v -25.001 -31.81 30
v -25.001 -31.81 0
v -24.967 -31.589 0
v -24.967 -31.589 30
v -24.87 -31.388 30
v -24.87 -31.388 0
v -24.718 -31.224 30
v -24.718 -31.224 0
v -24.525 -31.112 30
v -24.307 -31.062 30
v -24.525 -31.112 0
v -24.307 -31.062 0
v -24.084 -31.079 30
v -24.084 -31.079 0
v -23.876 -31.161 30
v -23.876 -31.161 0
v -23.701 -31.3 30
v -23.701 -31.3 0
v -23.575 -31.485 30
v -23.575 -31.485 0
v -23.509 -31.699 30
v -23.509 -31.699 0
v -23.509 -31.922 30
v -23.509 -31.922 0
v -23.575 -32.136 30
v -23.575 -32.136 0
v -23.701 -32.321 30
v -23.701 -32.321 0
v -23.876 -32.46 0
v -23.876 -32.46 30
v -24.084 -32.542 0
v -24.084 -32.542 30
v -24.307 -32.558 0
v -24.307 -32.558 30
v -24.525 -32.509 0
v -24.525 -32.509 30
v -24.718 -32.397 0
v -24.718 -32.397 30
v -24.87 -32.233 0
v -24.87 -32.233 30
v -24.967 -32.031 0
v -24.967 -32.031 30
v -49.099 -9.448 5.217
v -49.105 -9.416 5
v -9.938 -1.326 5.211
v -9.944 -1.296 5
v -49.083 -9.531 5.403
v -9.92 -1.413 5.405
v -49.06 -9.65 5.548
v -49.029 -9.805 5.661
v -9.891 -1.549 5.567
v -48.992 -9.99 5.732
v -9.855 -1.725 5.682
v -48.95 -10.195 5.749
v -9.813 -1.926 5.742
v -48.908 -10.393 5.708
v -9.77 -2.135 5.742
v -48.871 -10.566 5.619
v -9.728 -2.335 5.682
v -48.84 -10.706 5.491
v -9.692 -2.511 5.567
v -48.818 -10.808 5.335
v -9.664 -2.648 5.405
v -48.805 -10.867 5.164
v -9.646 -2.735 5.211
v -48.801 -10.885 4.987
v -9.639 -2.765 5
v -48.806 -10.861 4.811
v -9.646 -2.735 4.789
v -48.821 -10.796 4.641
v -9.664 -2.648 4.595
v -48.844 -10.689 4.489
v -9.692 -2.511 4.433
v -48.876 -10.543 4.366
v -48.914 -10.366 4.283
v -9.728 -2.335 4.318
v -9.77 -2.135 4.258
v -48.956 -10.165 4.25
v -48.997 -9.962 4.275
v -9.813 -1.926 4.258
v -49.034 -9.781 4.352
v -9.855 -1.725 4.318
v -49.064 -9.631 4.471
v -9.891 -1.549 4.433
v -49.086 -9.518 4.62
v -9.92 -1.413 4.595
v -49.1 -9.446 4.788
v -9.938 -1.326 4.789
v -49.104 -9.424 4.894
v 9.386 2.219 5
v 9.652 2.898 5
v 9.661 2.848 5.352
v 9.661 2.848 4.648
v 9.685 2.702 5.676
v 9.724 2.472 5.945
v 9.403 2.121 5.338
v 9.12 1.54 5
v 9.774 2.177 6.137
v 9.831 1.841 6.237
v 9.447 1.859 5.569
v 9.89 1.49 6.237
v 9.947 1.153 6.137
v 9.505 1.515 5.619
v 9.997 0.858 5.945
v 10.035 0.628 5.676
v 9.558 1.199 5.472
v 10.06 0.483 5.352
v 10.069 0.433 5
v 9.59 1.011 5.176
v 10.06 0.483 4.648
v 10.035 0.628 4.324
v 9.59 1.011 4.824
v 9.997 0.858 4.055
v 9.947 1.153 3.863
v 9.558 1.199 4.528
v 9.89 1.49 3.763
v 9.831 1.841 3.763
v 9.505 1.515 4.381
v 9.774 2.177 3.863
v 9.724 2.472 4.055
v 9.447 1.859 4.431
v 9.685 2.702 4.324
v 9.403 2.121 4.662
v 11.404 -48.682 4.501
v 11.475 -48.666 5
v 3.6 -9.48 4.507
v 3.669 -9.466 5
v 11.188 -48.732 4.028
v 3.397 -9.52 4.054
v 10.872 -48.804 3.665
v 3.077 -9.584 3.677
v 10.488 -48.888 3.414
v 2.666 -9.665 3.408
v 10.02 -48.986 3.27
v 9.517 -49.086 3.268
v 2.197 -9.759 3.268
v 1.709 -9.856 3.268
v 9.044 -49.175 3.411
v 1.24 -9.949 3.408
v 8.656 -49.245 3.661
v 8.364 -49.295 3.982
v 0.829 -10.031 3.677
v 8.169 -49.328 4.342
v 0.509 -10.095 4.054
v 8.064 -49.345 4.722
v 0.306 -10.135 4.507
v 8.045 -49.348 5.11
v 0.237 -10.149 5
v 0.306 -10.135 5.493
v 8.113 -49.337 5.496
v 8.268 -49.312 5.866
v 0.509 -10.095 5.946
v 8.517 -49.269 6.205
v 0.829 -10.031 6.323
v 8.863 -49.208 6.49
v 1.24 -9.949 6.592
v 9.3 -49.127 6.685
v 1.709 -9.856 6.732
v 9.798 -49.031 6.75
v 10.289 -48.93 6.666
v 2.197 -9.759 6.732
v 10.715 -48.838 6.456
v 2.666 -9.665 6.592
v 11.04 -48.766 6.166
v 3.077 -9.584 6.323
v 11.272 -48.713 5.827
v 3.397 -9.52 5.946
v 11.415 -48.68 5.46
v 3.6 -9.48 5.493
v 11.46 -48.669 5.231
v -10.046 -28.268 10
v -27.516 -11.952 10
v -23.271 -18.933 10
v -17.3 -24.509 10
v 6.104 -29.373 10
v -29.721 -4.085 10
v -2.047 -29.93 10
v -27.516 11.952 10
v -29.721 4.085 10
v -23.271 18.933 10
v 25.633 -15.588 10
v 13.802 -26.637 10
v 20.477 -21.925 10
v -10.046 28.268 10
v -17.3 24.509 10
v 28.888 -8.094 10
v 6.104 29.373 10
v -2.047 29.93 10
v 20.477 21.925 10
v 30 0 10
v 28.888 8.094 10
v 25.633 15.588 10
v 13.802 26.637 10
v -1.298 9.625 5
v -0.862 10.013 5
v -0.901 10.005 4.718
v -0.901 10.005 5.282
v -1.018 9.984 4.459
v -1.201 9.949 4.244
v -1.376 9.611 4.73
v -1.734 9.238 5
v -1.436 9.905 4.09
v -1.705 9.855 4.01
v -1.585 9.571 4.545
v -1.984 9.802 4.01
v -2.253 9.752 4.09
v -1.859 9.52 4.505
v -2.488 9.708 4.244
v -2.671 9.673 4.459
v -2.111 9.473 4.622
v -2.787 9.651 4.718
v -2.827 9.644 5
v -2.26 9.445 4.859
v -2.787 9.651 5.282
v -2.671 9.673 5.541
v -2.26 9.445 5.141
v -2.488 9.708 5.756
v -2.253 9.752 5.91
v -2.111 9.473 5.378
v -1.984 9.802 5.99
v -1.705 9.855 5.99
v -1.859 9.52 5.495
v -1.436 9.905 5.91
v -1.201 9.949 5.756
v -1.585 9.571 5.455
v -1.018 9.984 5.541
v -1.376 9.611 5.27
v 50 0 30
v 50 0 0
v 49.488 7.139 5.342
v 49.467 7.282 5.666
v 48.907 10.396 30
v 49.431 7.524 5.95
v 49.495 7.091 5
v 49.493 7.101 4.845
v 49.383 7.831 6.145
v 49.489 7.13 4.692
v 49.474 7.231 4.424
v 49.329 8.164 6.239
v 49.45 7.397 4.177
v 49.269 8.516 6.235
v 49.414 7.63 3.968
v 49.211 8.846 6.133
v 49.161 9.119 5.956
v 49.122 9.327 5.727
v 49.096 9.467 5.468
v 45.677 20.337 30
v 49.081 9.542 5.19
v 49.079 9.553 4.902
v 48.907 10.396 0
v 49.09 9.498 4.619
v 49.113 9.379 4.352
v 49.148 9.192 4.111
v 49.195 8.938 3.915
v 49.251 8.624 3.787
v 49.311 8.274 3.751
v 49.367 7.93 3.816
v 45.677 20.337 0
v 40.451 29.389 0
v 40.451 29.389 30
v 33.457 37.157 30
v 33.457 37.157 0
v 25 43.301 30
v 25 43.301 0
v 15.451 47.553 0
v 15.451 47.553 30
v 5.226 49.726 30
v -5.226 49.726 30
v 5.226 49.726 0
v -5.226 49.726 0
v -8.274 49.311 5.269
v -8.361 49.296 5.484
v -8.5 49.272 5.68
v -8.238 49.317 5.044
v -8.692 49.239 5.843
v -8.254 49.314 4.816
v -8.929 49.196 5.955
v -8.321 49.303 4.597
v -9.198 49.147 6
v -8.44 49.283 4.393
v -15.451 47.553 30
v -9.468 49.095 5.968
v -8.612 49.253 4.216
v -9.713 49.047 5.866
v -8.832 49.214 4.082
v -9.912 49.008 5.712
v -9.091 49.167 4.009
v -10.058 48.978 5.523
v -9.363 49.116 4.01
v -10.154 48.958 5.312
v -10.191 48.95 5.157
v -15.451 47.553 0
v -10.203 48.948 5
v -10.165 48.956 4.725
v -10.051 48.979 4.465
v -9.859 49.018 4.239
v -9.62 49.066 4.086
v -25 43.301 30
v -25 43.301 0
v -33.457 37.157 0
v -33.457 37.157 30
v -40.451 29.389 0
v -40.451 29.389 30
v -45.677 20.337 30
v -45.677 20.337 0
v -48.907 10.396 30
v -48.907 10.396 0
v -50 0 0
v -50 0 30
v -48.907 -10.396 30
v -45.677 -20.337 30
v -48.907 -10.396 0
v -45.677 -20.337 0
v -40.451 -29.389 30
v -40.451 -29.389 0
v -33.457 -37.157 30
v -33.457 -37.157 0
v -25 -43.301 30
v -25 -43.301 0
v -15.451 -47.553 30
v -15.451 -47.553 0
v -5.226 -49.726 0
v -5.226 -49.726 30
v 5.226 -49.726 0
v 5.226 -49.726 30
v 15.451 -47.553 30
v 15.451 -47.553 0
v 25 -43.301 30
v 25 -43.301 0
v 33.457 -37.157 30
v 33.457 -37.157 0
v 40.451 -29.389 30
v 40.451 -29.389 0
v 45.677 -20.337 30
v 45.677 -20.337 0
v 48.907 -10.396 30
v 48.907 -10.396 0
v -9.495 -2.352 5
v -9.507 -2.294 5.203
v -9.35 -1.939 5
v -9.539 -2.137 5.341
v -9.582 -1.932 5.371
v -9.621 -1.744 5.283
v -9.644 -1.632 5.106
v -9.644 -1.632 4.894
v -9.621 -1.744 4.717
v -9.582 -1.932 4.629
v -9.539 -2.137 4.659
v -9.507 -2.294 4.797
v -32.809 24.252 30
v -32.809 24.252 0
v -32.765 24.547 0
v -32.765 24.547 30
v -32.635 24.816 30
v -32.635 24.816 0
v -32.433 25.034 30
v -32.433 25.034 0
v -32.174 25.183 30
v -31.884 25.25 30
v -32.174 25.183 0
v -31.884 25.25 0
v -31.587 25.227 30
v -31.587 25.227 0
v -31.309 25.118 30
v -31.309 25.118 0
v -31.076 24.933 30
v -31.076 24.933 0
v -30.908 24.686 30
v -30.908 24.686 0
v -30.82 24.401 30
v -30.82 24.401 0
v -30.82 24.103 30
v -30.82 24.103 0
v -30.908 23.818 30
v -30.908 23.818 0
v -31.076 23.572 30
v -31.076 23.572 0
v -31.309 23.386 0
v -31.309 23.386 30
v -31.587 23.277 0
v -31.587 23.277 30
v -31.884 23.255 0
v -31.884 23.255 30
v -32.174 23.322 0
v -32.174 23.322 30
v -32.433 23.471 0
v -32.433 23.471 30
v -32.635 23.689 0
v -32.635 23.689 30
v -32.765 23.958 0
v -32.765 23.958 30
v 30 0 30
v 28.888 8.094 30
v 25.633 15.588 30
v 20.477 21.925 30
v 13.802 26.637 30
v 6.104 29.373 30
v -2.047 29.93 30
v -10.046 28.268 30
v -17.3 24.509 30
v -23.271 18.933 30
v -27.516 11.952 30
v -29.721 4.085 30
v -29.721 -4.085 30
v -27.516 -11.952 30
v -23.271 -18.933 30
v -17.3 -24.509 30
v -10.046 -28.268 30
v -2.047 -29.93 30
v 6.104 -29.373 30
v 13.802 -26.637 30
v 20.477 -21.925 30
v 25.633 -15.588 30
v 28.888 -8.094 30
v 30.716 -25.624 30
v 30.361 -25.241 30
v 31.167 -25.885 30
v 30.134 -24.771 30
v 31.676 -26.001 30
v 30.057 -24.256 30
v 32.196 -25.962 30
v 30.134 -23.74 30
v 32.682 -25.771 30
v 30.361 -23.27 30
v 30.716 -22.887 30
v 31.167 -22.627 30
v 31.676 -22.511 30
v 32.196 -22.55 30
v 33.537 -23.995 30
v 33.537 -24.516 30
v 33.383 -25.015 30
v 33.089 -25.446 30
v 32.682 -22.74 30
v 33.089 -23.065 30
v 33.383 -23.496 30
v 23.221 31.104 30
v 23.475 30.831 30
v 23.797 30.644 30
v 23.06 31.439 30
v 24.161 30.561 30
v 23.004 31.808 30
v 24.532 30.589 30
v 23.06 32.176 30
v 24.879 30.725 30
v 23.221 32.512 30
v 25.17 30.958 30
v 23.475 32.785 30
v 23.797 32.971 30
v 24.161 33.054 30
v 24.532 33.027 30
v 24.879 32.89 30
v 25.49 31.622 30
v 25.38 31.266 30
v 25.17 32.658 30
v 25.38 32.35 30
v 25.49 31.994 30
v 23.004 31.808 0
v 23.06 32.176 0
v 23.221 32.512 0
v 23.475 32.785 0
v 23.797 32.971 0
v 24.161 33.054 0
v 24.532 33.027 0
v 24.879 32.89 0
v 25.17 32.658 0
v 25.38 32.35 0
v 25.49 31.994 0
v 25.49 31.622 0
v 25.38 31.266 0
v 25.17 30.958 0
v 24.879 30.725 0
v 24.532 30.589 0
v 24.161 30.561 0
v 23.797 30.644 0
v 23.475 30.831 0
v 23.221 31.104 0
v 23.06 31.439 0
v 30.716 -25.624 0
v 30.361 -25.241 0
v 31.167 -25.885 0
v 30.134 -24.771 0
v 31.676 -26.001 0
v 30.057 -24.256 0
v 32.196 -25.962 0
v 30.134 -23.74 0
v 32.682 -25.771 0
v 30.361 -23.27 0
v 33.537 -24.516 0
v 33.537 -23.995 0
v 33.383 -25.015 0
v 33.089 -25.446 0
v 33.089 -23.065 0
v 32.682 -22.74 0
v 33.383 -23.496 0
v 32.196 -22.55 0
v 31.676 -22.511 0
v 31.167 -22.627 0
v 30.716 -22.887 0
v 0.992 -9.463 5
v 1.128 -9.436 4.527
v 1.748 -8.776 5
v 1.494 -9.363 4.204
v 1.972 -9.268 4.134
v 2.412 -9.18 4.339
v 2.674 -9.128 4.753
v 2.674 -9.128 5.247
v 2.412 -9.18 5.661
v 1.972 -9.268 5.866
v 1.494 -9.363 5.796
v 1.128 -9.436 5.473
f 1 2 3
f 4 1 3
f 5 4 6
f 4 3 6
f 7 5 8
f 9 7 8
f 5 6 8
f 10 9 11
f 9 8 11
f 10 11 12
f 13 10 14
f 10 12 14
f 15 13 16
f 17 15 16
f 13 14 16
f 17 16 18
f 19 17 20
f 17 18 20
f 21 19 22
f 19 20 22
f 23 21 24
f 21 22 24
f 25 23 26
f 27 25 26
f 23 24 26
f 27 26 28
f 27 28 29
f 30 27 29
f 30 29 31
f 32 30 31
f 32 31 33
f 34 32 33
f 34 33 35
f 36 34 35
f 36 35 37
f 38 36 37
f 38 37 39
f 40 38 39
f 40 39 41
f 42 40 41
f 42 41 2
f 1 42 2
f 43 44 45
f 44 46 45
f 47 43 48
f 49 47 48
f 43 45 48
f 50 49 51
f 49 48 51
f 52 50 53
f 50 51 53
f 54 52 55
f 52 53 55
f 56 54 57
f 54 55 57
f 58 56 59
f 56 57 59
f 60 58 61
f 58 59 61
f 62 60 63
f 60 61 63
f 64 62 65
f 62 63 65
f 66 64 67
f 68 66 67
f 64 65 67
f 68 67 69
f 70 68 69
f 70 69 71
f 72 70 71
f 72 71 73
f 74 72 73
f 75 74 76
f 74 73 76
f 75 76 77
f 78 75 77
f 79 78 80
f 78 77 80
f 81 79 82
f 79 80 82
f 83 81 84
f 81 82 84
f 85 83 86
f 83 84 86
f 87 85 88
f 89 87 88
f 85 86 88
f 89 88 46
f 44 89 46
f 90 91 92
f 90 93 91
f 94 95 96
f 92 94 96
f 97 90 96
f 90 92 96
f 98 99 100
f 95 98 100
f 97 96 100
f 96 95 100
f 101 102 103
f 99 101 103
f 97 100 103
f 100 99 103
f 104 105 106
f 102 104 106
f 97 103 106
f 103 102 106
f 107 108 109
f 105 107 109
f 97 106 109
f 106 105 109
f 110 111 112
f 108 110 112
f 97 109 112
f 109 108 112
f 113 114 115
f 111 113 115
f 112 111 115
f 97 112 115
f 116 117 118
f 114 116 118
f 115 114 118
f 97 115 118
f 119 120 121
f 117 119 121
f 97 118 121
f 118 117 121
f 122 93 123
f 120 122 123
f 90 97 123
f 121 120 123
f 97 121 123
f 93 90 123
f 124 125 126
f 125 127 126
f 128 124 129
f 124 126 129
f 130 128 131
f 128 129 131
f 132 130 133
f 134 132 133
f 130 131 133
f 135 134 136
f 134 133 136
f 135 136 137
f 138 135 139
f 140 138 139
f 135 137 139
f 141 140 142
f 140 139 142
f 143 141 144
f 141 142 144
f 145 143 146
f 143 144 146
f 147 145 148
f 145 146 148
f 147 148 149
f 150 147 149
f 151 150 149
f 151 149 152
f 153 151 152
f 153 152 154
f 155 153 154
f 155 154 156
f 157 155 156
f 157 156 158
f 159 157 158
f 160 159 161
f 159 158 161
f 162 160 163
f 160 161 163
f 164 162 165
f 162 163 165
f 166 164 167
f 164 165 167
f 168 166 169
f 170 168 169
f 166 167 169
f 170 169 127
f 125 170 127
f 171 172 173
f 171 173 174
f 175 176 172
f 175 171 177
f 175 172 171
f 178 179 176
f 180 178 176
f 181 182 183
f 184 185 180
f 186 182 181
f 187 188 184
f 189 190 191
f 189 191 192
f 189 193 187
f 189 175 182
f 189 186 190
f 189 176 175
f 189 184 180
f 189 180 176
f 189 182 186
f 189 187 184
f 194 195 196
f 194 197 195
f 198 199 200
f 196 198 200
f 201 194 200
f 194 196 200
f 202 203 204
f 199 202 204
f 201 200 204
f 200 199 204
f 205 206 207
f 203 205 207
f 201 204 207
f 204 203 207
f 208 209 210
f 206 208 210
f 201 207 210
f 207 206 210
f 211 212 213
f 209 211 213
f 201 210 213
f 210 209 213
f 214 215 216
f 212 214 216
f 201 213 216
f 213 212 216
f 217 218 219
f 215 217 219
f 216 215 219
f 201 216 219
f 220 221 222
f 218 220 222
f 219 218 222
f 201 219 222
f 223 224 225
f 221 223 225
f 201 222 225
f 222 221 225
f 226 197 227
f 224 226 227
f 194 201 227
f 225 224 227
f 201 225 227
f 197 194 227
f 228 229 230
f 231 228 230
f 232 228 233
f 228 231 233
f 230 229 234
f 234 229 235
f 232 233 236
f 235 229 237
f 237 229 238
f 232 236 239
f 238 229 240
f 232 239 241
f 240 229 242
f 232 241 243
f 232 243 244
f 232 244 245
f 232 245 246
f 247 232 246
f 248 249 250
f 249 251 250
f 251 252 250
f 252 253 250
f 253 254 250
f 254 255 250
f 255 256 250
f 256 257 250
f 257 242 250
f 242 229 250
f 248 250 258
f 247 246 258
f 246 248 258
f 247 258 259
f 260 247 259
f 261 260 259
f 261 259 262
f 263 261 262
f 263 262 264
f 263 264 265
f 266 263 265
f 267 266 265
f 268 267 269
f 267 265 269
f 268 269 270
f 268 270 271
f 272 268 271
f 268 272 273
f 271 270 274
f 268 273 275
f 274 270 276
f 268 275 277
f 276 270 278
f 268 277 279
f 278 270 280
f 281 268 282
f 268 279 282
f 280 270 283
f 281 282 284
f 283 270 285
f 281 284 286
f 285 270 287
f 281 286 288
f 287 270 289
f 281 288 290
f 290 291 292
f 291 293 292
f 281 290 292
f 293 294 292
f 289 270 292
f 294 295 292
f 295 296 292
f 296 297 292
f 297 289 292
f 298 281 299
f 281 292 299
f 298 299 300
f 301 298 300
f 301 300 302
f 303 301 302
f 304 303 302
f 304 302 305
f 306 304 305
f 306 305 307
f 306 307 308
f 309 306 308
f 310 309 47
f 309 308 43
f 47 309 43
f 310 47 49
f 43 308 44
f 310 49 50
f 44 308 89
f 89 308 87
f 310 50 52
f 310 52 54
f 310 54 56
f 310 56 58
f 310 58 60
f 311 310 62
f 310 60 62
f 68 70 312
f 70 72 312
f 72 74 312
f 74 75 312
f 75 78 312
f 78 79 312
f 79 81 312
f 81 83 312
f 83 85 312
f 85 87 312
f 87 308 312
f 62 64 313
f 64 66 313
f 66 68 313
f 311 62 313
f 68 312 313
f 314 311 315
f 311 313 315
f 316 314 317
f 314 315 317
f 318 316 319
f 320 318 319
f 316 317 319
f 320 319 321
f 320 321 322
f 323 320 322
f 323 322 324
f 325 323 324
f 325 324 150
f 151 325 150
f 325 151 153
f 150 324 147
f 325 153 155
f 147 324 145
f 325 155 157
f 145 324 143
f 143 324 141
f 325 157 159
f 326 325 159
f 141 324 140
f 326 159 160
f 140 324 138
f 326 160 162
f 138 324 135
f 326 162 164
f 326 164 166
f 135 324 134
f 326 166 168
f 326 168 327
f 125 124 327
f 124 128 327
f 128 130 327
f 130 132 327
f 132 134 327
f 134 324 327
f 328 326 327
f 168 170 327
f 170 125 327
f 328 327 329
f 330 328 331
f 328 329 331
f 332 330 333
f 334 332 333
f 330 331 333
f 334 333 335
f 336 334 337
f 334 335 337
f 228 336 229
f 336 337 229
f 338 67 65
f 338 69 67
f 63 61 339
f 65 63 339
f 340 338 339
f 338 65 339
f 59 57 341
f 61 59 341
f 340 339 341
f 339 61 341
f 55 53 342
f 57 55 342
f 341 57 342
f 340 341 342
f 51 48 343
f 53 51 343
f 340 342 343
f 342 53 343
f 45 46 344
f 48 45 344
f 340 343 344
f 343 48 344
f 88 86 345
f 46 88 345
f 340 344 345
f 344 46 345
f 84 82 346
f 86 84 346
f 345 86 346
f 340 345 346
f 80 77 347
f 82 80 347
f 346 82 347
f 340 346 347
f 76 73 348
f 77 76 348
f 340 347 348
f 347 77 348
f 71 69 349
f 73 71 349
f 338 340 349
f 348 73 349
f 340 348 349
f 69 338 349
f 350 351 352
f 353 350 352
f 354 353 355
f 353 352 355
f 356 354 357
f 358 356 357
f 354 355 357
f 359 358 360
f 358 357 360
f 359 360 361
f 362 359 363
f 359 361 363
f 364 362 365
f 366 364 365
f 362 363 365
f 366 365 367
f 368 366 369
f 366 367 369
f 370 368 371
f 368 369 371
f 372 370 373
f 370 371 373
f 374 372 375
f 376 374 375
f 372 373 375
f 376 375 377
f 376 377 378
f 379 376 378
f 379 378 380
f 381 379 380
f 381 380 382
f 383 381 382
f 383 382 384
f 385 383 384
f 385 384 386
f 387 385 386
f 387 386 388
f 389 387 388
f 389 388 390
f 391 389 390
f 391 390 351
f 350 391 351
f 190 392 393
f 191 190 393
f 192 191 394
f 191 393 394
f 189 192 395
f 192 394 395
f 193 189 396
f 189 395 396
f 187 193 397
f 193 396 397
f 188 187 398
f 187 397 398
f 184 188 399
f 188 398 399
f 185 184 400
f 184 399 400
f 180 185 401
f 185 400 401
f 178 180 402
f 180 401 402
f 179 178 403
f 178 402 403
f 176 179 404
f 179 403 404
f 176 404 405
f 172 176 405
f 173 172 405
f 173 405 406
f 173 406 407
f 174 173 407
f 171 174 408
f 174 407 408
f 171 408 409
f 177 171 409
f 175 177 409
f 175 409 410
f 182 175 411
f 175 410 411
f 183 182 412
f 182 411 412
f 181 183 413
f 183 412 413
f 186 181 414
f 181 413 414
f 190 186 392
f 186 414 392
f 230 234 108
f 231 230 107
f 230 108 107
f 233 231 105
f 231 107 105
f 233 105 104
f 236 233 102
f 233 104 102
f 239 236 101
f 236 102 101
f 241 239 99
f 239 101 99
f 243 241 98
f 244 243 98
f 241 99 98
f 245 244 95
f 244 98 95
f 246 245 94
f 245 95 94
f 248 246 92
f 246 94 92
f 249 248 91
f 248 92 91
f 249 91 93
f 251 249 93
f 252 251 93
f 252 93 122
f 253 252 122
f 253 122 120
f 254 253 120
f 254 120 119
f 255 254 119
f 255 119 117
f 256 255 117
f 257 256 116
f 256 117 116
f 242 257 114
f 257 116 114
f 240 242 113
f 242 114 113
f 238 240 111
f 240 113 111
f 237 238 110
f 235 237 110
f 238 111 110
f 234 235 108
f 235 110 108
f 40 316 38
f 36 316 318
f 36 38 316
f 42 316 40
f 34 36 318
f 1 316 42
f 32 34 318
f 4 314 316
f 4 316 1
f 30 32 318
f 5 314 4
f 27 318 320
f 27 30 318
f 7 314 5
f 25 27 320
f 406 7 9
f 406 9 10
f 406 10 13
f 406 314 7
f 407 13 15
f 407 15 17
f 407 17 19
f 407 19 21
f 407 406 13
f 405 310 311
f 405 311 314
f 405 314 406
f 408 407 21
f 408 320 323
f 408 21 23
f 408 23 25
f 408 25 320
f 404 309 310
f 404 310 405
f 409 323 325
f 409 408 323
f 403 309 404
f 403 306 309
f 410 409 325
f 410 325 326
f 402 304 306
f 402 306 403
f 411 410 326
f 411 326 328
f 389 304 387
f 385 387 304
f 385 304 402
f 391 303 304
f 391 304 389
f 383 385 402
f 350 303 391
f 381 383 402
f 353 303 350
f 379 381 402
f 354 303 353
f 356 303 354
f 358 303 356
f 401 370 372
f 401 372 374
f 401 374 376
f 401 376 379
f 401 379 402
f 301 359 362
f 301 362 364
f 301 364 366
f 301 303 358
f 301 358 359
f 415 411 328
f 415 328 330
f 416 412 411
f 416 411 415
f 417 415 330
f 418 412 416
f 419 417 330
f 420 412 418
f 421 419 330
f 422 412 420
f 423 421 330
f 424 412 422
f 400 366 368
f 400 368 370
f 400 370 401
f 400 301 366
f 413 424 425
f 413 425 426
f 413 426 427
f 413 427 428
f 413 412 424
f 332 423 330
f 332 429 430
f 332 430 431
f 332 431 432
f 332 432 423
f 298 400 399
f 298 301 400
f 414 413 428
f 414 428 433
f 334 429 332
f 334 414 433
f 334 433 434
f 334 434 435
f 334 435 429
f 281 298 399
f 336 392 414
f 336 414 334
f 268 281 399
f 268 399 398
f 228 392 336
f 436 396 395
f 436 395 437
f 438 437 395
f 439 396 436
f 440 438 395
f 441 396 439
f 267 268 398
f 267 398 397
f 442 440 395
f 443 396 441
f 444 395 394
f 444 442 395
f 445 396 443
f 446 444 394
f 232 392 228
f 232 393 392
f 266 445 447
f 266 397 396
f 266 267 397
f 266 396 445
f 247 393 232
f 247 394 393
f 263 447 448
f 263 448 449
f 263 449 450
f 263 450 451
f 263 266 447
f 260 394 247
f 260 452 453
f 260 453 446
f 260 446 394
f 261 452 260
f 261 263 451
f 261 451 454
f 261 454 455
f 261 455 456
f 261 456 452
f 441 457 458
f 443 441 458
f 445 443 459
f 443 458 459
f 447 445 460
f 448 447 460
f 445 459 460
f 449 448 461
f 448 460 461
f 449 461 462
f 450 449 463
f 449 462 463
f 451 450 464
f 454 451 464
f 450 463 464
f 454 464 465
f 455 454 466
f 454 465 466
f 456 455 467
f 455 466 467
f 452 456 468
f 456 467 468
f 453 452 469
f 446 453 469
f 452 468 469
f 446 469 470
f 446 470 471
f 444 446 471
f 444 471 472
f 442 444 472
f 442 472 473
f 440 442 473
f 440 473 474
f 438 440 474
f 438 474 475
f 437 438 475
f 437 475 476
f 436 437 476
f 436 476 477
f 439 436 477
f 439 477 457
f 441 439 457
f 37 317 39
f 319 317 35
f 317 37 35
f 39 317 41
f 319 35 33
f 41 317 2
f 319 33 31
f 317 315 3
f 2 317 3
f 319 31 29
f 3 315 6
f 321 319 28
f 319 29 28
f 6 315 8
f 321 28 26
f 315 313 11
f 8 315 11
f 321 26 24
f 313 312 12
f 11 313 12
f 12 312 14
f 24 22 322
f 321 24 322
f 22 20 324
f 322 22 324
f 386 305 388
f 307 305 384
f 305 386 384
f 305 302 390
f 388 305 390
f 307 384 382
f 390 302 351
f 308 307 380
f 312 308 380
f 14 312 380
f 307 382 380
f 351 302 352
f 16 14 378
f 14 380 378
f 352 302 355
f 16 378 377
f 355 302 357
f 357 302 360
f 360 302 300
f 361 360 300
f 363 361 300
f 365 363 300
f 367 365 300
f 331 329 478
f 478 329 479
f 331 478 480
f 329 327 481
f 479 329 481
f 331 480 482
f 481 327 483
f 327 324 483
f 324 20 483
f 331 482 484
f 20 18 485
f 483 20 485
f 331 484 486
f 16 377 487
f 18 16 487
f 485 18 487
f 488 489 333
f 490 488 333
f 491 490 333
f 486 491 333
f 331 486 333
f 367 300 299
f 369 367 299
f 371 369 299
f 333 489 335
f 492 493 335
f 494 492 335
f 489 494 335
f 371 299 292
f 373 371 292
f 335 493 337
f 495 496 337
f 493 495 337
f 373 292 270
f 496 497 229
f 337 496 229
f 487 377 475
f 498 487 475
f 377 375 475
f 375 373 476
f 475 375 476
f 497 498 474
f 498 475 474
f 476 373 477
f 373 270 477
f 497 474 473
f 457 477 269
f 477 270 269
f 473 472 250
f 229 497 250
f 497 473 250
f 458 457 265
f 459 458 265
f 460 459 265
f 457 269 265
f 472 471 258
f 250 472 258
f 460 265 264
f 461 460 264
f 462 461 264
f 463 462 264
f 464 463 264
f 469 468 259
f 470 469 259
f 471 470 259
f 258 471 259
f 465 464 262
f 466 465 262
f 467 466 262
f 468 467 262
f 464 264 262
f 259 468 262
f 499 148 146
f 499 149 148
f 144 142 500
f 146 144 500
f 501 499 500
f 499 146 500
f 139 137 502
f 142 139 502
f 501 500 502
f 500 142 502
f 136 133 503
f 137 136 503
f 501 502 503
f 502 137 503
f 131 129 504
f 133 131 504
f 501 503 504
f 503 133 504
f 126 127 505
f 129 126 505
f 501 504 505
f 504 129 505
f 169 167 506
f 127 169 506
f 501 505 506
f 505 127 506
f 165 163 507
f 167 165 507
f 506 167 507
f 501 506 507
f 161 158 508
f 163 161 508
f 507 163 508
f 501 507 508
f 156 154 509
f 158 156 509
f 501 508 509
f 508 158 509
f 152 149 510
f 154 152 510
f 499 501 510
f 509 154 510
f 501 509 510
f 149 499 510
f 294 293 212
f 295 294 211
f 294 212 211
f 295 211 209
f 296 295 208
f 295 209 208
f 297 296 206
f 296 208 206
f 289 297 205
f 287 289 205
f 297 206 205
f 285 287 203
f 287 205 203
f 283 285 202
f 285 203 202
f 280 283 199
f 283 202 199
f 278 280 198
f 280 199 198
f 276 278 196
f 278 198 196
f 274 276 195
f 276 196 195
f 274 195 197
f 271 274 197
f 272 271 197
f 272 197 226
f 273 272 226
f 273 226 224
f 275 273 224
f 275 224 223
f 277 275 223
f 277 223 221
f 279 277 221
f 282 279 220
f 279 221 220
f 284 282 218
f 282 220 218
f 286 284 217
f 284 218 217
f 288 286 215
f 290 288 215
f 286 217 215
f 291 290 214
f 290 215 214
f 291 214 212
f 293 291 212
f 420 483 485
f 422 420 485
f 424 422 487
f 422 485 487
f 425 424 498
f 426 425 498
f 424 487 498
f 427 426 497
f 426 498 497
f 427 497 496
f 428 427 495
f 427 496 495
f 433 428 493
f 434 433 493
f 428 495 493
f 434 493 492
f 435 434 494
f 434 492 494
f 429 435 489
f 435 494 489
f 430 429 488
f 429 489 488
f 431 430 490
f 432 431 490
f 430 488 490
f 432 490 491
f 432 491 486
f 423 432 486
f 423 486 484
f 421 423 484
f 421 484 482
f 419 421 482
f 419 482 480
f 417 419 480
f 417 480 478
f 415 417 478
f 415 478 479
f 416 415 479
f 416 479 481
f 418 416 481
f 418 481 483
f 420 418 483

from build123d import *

# Parameters (mm, degrees)
SKIZZE1_R                            = 50
AUFSATZ_LINEAR_AUSTRAGEN1_DEPTH      = 30
SKIZZE2_R                            = 30
SCHNITT_LINEAR_AUSTRAGEN1_DEPTH      = 20
F_3_5_3_5_DURCHMESSER_BOHRUNG1_D     = 3.5
F_3_5_3_5_DURCHMESSER_BOHRUNG1_DEPTH = 40
F_3_5_3_5_DURCHMESSER_BOHRUNG1_TIP   = 1.051506083
F_2_5_2_5_DURCHMESSER_BOHRUNG1_D     = 2.5
F_2_5_2_5_DURCHMESSER_BOHRUNG1_DEPTH = 40
F_2_5_2_5_DURCHMESSER_BOHRUNG1_TIP   = 0.751075774
F_2_0_2_DURCHMESSER_BOHRUNG1_D       = 2
F_2_0_2_DURCHMESSER_BOHRUNG1_DEPTH   = 40
F_2_0_2_DURCHMESSER_BOHRUNG1_TIP     = 0.600860619
F_1_5_1_5_DURCHMESSER_BOHRUNG1_D     = 1.5
F_1_5_1_5_DURCHMESSER_BOHRUNG1_DEPTH = 40
F_1_5_1_5_DURCHMESSER_BOHRUNG1_TIP   = 0.450645464
F_3_5_3_5_DURCHMESSER_BOHRUNG2_D     = 3.5
F_2_5_2_5_DURCHMESSER_BOHRUNG2_D     = 2.5
F_2_0_2_DURCHMESSER_BOHRUNG2_D       = 2
F_1_5_1_5_DURCHMESSER_BOHRUNG3_D     = 1.5


with BuildPart() as part:
    # Skizze1 → Aufsatz-Linear austragen1 (new body)
    with BuildSketch(Plane.XY):
        Circle(SKIZZE1_R)
    extrude(amount=AUFSATZ_LINEAR_AUSTRAGEN1_DEPTH)

    # Skizze2 → Schnitt-Linear austragen1 (cut)
    with BuildSketch(Plane.XY.offset(30)):
        Circle(SKIZZE2_R)
    extrude(amount=-SCHNITT_LINEAR_AUSTRAGEN1_DEPTH, mode=Mode.SUBTRACT)

    # Ø3.5 (3.5) Durchmesser Bohrung1
    with Locations(Plane(origin=(9.764219033, -49.037332989, 5), x_dir=(-0.980746659782, -0.195284380652, 0), z_dir=(0.195284380652, -0.980746659782, 0))):
        with Locations((0, 0)):
            Hole(F_3_5_3_5_DURCHMESSER_BOHRUNG1_D / 2, depth=F_3_5_3_5_DURCHMESSER_BOHRUNG1_DEPTH)
            with Locations((0, 0, -(F_3_5_3_5_DURCHMESSER_BOHRUNG1_DEPTH + F_3_5_3_5_DURCHMESSER_BOHRUNG1_TIP / 2))):  # 118° drill point
                Cone(0, F_3_5_3_5_DURCHMESSER_BOHRUNG1_D / 2, F_3_5_3_5_DURCHMESSER_BOHRUNG1_TIP, mode=Mode.SUBTRACT)

    # Ø2.5 (2.5) Durchmesser Bohrung1
    with Locations(Plane(origin=(49.30181814, 8.326507554, 5), x_dir=(-0.166530151078, 0.986036362809, 0), z_dir=(0.986036362809, 0.166530151078, 0))):
        with Locations((0, 0)):
            Hole(F_2_5_2_5_DURCHMESSER_BOHRUNG1_D / 2, depth=F_2_5_2_5_DURCHMESSER_BOHRUNG1_DEPTH)
            with Locations((0, 0, -(F_2_5_2_5_DURCHMESSER_BOHRUNG1_DEPTH + F_2_5_2_5_DURCHMESSER_BOHRUNG1_TIP / 2))):  # 118° drill point
                Cone(0, F_2_5_2_5_DURCHMESSER_BOHRUNG1_D / 2, F_2_5_2_5_DURCHMESSER_BOHRUNG1_TIP, mode=Mode.SUBTRACT)

    # Ø2.0 (2) Durchmesser Bohrung1
    with Locations(Plane(origin=(-9.221972092, 49.142193996, 5), x_dir=(0.982843879919, 0.184439441837, 0), z_dir=(-0.184439441837, 0.982843879919, 0))):
        with Locations((0, 0)):
            Hole(F_2_0_2_DURCHMESSER_BOHRUNG1_D / 2, depth=F_2_0_2_DURCHMESSER_BOHRUNG1_DEPTH)
            with Locations((0, 0, -(F_2_0_2_DURCHMESSER_BOHRUNG1_DEPTH + F_2_0_2_DURCHMESSER_BOHRUNG1_TIP / 2))):  # 118° drill point
                Cone(0, F_2_0_2_DURCHMESSER_BOHRUNG1_D / 2, F_2_0_2_DURCHMESSER_BOHRUNG1_TIP, mode=Mode.SUBTRACT)

    # Ø1.5 (1.5) Durchmesser Bohrung1
    with Locations(Plane(origin=(-48.958569775, -10.151770565, 5), x_dir=(0.203035411308, -0.979171395495, 0), z_dir=(-0.979171395495, -0.203035411308, 0))):
        with Locations((0, 0)):
            Hole(F_1_5_1_5_DURCHMESSER_BOHRUNG1_D / 2, depth=F_1_5_1_5_DURCHMESSER_BOHRUNG1_DEPTH)
            with Locations((0, 0, -(F_1_5_1_5_DURCHMESSER_BOHRUNG1_DEPTH + F_1_5_1_5_DURCHMESSER_BOHRUNG1_TIP / 2))):  # 118° drill point
                Cone(0, F_1_5_1_5_DURCHMESSER_BOHRUNG1_D / 2, F_1_5_1_5_DURCHMESSER_BOHRUNG1_TIP, mode=Mode.SUBTRACT)

    # Ø3.5 (3.5) Durchmesser Bohrung2 (through all)
    with Locations(Plane.XY.offset(30)):
        with Locations((31.806649029, -24.255660732)):
            Hole(F_3_5_3_5_DURCHMESSER_BOHRUNG2_D / 2)

    # Ø2.5 (2.5) Durchmesser Bohrung2 (through all)
    with Locations(Plane.XY.offset(30)):
        with Locations((24.254021663, 31.807898911)):
            Hole(F_2_5_2_5_DURCHMESSER_BOHRUNG2_D / 2)

    # Ø2.0 (2) Durchmesser Bohrung2 (through all)
    with Locations(Plane.XY.offset(30)):
        with Locations((-31.809148709, 24.25238253)):
            Hole(F_2_0_2_DURCHMESSER_BOHRUNG2_D / 2)

    # Ø1.5 (1.5) Durchmesser Bohrung3 (through all)
    with Locations(Plane.XY.offset(30)):
        with Locations((-24.250743333, -31.810398422)):
            Hole(F_1_5_1_5_DURCHMESSER_BOHRUNG3_D / 2)


solid = part.part
